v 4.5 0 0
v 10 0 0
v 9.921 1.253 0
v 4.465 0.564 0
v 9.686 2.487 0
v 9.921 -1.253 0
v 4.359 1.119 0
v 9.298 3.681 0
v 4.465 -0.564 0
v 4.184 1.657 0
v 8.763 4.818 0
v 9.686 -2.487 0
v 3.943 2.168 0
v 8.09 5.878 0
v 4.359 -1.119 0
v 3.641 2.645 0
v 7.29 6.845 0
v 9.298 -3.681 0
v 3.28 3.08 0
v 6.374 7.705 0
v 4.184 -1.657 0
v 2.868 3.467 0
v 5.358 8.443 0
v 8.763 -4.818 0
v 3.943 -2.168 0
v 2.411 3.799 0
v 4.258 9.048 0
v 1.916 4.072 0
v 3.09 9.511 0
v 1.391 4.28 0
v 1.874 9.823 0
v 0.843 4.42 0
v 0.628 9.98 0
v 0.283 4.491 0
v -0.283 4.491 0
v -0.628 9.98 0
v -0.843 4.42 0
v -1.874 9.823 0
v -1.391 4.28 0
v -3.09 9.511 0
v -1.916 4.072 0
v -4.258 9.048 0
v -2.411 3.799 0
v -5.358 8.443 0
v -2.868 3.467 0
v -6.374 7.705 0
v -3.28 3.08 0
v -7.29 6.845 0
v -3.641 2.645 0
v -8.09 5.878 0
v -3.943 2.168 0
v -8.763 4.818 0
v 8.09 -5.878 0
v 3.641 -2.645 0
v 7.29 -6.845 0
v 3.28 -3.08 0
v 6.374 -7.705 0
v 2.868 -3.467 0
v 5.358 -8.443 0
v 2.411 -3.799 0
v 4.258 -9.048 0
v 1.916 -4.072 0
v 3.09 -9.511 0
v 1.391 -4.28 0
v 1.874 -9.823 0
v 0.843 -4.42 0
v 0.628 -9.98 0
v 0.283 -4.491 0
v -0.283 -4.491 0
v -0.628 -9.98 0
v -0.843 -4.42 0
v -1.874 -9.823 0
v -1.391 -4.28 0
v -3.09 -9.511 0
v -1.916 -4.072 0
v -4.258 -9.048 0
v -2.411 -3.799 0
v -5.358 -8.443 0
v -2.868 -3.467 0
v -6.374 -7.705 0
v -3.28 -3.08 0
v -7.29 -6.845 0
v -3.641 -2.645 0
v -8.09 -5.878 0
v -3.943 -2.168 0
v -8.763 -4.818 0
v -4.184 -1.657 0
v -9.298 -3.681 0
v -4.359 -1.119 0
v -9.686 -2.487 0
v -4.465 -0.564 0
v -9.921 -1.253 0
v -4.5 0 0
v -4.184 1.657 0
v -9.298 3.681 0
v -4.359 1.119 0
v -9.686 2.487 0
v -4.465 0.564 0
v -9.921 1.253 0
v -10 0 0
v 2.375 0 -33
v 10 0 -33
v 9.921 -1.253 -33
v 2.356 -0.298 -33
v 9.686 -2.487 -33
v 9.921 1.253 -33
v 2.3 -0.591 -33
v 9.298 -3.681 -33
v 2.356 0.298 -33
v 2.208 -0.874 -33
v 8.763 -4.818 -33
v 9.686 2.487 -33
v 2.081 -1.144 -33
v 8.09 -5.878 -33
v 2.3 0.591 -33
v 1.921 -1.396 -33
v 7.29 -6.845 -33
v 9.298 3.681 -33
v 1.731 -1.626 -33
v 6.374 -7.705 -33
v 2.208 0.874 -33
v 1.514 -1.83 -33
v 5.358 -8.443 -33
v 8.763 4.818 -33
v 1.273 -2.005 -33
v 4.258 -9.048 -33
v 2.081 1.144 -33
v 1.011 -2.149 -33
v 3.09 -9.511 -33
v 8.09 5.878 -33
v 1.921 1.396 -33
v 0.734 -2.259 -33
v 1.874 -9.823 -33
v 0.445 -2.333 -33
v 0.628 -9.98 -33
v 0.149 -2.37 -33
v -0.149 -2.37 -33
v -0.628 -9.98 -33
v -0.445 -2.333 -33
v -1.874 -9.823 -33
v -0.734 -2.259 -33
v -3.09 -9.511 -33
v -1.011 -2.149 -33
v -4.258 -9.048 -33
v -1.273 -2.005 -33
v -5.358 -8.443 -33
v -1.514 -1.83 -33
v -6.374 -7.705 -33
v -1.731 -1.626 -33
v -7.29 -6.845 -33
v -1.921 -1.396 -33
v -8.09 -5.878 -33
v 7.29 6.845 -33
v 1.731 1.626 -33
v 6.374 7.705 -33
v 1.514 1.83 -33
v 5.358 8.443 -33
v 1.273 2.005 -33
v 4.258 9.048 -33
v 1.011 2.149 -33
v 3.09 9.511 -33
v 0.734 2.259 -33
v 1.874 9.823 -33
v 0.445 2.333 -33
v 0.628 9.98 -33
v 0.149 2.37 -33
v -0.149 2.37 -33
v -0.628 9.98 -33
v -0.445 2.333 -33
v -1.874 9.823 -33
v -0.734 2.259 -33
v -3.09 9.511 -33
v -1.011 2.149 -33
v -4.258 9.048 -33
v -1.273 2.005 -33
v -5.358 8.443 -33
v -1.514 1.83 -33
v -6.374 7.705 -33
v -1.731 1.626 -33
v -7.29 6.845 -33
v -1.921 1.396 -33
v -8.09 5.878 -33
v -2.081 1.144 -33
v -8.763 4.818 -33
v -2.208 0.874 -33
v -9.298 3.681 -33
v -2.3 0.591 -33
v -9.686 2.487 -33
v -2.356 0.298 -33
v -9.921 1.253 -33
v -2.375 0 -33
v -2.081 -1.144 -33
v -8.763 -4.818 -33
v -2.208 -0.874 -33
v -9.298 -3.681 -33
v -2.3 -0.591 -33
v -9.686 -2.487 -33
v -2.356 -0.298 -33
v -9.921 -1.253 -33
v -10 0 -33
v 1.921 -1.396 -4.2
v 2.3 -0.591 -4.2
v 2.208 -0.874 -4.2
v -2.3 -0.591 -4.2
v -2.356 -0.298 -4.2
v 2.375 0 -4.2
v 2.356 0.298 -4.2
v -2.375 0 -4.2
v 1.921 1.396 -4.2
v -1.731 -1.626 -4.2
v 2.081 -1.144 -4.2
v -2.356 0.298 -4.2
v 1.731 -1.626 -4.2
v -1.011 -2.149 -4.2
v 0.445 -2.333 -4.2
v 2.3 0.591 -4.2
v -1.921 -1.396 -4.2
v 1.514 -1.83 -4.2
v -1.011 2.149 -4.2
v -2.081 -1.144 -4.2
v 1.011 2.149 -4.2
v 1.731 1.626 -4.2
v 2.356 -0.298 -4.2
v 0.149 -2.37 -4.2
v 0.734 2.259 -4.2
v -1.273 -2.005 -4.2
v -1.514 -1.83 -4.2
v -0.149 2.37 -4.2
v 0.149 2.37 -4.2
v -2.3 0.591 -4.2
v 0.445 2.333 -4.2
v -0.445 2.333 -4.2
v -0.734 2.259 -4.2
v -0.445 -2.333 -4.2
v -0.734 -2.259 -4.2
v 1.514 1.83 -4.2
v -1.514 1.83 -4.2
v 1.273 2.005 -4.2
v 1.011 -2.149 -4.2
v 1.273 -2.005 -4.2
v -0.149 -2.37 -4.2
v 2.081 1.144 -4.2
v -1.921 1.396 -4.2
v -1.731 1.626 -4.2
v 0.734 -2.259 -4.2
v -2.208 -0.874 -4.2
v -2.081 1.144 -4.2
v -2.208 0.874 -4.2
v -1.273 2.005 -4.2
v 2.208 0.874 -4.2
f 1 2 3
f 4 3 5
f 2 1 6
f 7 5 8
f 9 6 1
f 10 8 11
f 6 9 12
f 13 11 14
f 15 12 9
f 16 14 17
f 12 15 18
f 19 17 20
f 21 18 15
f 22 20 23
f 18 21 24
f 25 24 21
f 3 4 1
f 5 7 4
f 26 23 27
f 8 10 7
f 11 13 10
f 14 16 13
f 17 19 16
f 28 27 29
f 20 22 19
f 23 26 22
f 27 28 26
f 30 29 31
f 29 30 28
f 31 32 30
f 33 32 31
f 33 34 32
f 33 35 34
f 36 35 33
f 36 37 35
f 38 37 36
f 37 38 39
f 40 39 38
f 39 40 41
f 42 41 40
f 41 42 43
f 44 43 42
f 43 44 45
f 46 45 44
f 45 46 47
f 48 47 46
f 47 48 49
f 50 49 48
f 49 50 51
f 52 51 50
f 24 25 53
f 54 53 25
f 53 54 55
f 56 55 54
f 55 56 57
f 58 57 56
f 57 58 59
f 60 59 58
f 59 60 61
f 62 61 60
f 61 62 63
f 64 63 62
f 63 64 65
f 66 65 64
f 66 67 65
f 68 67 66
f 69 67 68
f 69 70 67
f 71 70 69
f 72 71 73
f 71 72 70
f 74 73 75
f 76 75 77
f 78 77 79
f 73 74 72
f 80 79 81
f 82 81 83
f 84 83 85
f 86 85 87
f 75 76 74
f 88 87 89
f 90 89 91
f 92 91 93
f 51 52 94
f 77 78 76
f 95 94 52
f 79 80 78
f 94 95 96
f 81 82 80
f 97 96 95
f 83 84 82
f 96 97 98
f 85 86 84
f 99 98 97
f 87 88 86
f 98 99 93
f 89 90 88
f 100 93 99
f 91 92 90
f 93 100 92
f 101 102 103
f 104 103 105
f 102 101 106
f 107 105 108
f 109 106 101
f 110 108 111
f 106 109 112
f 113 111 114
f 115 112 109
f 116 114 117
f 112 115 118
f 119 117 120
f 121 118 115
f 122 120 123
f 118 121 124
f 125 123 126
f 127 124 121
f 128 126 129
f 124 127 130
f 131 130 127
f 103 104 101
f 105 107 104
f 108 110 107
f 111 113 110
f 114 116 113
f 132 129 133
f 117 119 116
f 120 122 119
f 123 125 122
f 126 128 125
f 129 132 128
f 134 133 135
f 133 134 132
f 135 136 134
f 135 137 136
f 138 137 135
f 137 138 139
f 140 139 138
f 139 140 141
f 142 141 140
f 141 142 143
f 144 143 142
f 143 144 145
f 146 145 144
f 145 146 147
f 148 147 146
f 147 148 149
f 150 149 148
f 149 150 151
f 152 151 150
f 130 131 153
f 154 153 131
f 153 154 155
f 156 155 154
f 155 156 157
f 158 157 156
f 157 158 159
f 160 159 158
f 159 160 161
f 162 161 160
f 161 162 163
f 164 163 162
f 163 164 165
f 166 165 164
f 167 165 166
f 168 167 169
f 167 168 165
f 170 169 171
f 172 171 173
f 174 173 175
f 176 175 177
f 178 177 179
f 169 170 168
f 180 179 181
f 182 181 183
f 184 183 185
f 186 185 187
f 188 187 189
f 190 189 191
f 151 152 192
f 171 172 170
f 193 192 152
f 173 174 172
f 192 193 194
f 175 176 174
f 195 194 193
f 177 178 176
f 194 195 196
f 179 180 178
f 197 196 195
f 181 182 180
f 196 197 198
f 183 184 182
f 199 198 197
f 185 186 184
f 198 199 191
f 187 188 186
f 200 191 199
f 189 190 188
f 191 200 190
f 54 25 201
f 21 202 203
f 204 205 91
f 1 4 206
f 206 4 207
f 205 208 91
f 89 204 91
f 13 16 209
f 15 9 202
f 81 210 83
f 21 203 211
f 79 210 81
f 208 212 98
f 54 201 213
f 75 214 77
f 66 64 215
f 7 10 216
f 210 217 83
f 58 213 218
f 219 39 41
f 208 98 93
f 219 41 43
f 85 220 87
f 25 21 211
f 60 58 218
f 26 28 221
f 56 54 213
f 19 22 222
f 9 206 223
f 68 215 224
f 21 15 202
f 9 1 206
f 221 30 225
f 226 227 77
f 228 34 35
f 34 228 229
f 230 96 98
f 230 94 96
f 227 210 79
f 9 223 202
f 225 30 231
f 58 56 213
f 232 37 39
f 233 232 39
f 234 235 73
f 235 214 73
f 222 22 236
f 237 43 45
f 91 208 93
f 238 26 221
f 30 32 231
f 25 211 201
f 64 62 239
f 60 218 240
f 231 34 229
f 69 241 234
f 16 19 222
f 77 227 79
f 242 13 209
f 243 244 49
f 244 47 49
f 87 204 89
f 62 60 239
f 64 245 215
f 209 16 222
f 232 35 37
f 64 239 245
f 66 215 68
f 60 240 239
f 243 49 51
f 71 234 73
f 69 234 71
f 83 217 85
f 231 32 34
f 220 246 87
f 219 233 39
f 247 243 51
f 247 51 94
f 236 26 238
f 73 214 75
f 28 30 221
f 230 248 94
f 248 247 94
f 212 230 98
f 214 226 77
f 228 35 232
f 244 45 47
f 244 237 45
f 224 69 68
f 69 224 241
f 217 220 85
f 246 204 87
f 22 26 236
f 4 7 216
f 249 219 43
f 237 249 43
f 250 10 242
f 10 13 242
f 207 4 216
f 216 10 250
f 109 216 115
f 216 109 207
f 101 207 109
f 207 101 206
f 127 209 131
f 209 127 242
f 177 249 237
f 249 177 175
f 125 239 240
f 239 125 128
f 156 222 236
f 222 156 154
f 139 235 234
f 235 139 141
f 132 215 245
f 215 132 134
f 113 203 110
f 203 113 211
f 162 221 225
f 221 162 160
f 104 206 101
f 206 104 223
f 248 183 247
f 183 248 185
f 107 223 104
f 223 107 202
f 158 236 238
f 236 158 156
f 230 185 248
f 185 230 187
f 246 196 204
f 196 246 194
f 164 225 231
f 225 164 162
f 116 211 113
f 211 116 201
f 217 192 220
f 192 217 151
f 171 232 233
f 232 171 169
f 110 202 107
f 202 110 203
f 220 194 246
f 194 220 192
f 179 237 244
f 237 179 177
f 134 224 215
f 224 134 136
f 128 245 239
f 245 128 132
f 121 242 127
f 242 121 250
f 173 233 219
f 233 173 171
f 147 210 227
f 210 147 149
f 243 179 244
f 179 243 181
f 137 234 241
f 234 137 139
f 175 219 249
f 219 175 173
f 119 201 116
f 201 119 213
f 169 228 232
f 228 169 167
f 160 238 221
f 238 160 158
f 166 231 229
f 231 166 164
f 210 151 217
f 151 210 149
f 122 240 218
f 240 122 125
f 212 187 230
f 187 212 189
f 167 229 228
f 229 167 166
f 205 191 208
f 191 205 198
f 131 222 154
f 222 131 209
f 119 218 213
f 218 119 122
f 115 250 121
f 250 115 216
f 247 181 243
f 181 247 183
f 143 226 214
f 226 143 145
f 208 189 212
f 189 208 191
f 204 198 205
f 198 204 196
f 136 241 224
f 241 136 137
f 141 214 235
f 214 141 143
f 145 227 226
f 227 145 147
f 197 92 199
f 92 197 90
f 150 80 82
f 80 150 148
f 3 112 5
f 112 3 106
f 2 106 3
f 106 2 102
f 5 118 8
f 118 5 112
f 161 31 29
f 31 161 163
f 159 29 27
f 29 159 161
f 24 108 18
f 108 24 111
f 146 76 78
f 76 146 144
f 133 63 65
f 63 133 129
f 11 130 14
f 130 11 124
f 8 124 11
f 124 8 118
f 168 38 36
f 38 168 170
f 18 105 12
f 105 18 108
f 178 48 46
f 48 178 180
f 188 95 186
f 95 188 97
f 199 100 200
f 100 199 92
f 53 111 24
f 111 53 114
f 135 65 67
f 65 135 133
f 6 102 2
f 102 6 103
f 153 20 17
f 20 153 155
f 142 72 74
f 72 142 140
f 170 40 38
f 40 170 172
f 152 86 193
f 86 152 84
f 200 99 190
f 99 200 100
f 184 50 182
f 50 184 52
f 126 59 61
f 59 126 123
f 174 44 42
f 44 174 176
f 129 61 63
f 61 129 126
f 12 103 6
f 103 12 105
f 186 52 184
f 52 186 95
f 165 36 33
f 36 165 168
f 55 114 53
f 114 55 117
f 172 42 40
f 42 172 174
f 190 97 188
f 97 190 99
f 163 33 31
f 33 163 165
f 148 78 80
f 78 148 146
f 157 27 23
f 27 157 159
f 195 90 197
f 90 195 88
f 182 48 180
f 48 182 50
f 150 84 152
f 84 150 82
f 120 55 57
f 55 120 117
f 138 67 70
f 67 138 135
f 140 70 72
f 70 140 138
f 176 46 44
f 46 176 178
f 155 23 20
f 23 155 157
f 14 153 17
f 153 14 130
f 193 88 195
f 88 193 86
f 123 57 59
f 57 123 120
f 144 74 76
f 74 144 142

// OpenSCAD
$fn = 50;


difference() {
	union() {
		translate(v = [0, 0, -33.0000000000]) {
			cylinder(h = 33, r = 10.0000000000);
		}
		cylinder(h = 0, r = 19.0000000000);
	}
	union() {
		translate(v = [0, 0, 0]) {
			rotate(a = [0, 0, 0]) {
				difference() {
					union() {
						#translate(v = [0, 0, -33.0000000000]) {
							cylinder(h = 33, r = 2.2500000000);
						}
						#translate(v = [0, 0, -4.2000000000]) {
							cylinder(h = 4.2000000000, r1 = 2.3750000000, r2 = 4.5000000000);
						}
						#translate(v = [0, 0, -33.0000000000]) {
							cylinder(h = 33, r = 2.3750000000);
						}
						#translate(v = [0, 0, -33.0000000000]) {
							cylinder(h = 33, r = 2.2500000000);
						}
					}
					union();
				}
			}
		}
	}
}
